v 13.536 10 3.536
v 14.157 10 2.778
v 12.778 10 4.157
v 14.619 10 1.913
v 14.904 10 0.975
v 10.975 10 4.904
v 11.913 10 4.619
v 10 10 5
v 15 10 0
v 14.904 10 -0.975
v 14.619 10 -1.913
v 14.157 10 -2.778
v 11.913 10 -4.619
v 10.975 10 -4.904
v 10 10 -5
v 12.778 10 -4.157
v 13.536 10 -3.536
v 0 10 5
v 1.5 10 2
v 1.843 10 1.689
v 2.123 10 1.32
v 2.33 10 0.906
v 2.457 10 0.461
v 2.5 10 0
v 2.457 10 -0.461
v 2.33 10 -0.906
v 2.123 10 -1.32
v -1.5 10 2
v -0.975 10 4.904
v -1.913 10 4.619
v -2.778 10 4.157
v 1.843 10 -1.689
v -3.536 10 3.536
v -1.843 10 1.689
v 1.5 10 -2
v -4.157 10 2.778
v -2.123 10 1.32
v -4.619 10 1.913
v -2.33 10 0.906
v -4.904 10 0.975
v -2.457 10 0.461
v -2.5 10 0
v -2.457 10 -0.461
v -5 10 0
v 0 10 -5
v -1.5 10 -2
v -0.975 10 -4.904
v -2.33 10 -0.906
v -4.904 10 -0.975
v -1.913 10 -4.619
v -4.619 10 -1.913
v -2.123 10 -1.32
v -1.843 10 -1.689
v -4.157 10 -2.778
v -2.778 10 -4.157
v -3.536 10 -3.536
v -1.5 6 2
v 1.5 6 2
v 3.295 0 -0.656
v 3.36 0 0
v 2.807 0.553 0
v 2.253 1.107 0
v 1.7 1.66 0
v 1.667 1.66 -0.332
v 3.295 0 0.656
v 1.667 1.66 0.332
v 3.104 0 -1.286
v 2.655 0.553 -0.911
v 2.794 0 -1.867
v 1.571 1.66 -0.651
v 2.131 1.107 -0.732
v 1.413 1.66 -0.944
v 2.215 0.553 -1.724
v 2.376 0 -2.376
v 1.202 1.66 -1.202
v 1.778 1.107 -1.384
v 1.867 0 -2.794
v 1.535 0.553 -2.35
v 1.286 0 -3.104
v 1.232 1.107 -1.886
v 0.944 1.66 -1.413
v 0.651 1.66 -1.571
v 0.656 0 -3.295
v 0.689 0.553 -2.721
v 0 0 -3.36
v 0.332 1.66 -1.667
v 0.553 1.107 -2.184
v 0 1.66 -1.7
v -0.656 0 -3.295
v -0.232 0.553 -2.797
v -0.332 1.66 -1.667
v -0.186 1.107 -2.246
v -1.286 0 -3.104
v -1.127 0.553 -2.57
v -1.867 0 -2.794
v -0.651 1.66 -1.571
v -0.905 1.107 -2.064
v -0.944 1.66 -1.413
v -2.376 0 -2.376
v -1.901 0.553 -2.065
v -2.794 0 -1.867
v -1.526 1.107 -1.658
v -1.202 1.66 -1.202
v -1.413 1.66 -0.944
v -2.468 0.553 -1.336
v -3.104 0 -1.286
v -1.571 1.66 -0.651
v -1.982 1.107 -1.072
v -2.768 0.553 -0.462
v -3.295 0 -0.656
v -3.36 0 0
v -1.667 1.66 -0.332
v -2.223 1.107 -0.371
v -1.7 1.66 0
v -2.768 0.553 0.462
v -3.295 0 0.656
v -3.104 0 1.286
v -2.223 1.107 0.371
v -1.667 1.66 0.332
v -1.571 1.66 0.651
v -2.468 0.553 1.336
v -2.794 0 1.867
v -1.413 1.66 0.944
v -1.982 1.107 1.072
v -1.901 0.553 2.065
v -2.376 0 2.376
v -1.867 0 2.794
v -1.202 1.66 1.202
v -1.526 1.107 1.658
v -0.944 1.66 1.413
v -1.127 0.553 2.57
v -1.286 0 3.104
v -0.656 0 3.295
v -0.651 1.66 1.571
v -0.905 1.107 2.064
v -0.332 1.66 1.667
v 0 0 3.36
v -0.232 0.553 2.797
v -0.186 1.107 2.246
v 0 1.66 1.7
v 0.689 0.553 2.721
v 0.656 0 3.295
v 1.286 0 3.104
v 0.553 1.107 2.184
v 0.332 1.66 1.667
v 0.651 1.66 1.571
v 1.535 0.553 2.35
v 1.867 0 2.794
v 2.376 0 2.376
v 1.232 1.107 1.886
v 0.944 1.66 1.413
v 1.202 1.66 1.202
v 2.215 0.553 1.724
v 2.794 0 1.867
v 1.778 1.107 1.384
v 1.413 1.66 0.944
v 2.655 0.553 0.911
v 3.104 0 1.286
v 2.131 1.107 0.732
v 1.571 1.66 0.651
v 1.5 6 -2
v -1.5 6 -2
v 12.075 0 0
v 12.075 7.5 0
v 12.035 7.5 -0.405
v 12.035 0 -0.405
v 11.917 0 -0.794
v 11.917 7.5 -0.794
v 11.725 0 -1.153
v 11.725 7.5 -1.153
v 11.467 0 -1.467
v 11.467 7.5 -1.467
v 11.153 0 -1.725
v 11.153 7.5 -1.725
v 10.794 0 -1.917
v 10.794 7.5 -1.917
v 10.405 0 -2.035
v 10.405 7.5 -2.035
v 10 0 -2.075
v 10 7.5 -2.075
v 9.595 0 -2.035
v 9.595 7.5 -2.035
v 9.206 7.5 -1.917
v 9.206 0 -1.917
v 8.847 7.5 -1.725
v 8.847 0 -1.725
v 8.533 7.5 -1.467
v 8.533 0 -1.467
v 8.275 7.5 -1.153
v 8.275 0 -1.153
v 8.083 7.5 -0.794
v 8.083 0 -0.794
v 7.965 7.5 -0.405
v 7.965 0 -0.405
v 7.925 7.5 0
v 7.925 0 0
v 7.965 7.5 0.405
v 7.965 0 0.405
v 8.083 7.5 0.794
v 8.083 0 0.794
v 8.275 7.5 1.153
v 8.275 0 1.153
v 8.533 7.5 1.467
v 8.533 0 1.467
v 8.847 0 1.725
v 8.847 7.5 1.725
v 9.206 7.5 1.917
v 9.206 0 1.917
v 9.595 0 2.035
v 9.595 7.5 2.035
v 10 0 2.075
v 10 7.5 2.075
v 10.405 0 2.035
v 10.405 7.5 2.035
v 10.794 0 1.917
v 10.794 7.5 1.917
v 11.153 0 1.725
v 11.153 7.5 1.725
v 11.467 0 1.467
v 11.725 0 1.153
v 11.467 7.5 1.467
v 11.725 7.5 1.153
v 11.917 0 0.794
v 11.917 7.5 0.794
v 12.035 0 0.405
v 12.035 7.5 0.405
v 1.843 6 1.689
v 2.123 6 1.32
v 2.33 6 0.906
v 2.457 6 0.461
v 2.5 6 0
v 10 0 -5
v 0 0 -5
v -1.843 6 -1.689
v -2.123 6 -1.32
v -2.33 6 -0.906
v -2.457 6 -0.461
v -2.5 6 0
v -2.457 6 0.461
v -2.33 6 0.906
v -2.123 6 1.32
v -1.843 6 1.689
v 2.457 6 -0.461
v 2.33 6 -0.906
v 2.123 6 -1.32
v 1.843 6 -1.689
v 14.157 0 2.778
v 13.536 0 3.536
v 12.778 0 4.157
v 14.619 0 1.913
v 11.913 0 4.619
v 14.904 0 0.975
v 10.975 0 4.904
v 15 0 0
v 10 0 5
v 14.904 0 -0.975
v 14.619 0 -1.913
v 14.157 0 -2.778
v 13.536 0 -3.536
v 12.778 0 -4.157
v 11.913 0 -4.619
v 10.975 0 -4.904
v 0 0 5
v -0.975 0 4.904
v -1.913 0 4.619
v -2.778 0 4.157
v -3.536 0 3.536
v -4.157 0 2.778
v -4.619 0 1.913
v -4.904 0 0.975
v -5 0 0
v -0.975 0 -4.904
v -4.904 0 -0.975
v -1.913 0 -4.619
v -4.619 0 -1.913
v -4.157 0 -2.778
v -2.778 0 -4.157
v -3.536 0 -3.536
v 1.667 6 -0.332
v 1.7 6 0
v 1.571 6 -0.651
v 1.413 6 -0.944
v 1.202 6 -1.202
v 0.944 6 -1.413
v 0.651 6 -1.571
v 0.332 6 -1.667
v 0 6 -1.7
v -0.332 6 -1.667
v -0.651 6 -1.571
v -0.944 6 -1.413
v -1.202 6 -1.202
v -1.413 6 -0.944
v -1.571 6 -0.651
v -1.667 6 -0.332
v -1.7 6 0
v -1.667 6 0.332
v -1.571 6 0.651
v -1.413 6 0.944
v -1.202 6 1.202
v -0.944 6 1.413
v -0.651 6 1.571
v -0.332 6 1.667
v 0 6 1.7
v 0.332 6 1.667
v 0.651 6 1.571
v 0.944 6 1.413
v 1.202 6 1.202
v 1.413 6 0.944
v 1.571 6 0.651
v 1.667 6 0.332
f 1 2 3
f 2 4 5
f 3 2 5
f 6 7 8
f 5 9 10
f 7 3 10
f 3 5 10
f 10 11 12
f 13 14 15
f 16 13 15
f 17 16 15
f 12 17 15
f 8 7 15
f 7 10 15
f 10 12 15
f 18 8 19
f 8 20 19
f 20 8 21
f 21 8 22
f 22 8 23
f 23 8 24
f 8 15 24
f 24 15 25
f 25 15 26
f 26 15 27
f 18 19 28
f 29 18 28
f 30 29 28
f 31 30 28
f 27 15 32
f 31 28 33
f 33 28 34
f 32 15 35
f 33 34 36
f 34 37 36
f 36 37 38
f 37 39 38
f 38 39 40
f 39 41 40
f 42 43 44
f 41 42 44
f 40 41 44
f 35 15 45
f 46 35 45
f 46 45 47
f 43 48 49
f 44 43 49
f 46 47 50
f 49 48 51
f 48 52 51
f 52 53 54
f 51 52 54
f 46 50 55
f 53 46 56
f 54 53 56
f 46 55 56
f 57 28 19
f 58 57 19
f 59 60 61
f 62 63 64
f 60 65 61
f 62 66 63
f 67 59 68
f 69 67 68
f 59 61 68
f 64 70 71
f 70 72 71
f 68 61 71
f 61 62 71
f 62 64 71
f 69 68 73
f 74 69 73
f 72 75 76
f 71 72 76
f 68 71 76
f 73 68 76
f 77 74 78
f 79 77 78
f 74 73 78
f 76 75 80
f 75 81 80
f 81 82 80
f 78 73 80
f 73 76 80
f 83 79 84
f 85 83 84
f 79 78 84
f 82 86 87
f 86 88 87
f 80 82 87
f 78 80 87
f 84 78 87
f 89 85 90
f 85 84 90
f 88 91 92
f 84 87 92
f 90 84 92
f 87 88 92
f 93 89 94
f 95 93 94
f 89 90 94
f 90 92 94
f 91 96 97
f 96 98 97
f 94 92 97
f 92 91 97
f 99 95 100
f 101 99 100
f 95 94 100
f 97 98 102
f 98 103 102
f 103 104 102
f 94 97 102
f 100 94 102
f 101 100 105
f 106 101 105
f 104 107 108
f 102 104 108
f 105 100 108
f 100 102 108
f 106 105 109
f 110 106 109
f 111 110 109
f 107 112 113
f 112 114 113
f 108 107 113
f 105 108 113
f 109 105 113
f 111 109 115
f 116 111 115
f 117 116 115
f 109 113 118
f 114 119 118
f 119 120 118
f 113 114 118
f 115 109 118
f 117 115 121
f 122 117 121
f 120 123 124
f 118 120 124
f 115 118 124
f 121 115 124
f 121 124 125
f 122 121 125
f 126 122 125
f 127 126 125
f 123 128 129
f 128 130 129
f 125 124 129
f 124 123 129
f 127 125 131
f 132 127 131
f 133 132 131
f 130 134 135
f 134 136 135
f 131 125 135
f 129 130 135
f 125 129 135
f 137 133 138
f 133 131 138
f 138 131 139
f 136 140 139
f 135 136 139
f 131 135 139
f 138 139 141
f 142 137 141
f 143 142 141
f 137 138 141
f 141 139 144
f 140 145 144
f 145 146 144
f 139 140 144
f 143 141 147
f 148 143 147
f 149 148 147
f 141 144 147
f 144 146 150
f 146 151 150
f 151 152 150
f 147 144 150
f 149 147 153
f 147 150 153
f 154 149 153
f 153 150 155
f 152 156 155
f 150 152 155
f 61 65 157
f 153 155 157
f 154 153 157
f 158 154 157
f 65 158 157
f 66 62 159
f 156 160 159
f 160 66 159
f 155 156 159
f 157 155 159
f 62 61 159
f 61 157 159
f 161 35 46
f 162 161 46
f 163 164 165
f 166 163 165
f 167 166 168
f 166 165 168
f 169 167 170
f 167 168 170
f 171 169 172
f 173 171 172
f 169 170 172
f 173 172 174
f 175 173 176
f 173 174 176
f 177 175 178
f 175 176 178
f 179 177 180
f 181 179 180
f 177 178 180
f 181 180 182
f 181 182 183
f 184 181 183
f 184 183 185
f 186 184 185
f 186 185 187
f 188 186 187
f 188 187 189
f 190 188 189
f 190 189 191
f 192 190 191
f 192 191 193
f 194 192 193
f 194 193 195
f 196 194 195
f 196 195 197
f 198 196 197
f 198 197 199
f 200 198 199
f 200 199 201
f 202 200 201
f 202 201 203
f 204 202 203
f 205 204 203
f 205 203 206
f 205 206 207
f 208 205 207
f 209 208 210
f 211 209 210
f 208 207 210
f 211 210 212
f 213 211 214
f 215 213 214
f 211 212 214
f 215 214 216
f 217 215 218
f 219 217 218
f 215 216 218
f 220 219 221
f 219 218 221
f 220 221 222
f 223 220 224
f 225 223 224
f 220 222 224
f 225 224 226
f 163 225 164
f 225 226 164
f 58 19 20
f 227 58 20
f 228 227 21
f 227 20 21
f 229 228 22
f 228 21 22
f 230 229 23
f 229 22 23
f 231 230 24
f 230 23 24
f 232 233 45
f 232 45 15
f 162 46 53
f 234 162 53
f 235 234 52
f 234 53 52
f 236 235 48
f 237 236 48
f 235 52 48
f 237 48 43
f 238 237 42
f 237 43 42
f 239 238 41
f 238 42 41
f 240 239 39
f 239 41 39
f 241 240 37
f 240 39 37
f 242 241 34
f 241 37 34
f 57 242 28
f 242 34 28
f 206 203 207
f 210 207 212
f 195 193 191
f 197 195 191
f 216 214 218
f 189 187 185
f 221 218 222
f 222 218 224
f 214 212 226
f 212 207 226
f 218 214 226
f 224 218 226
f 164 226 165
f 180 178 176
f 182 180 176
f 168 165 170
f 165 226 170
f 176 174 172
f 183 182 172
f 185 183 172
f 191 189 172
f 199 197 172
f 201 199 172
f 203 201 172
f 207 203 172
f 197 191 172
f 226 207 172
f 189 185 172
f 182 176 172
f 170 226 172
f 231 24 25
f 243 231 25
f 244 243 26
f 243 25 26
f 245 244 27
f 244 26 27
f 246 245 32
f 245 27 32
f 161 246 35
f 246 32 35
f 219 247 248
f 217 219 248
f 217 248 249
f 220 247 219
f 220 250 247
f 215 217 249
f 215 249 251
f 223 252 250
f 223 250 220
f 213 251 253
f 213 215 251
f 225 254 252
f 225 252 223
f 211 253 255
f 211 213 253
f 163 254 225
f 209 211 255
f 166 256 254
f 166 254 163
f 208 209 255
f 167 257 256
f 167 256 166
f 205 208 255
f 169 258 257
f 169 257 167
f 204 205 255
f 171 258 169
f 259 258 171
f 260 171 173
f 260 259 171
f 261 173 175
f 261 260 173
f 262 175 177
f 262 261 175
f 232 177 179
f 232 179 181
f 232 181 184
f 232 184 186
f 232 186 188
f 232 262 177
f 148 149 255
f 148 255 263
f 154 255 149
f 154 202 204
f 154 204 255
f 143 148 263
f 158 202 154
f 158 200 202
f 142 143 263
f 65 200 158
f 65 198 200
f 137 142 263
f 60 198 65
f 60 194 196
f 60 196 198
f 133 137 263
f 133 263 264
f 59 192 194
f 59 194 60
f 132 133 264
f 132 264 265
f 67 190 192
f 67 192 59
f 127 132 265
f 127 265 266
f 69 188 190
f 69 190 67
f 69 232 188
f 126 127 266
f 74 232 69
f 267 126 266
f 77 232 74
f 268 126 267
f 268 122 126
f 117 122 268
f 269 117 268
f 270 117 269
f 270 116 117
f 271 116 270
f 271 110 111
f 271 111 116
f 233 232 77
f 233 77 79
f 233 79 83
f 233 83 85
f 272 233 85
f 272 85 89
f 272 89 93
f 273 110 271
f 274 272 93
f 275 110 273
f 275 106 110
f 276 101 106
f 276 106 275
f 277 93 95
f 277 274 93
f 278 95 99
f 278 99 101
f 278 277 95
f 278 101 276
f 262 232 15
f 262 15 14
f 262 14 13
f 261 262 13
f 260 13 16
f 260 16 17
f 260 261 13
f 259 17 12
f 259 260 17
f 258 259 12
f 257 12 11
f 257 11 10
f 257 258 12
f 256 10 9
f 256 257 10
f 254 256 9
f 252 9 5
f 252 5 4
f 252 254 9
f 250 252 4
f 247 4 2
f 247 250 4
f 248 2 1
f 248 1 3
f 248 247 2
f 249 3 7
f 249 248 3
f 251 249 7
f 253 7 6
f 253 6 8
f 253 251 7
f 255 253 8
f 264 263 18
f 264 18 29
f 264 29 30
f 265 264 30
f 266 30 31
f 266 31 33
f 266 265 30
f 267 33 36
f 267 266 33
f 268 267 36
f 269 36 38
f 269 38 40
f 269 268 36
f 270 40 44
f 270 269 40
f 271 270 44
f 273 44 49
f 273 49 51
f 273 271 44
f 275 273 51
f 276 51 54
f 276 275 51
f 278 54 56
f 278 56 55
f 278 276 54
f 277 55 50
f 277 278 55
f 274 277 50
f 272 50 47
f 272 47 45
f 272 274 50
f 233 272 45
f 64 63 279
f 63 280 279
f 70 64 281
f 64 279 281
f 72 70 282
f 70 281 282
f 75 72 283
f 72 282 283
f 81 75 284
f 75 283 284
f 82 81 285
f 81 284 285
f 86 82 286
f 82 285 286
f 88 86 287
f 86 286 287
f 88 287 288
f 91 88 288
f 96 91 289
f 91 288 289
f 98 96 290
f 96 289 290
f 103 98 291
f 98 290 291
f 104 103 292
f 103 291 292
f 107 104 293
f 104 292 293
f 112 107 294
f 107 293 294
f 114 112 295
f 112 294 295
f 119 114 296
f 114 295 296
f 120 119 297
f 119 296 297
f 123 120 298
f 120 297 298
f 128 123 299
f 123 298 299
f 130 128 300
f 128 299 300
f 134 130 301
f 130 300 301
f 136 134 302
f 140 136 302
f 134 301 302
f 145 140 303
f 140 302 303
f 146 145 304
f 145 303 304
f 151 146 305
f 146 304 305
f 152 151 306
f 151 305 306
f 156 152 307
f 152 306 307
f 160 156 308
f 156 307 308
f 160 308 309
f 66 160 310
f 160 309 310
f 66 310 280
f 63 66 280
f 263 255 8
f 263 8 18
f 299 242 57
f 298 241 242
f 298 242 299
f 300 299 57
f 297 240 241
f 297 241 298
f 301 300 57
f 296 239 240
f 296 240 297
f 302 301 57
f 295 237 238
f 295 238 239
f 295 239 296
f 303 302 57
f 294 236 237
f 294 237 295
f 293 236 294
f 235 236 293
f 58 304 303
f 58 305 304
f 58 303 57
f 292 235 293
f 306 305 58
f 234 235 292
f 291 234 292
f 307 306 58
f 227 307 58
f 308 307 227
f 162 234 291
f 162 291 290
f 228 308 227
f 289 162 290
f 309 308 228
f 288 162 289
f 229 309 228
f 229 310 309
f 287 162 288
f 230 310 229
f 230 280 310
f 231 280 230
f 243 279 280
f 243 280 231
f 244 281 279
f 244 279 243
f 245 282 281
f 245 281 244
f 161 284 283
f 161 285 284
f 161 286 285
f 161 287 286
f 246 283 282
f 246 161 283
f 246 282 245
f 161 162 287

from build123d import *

# Parameters (mm, degrees)
EXTRUDE_1_DEPTH              = 10
CUT_EXTRUDE_1_DEPTH          = 4
HOLE_WIZARD_M3_1_D           = 3.4
HOLE_WIZARD_M3_1_DEPTH       = 8.1
HOLE_WIZARD_M3_1_CSINK_D     = 6.72
HOLE_WIZARD_M3_1_CSINK_ANGLE = 90
HOLE_WIZARD_M3_1_TIP         = 1.021463052
HOLE_WIZARD_1_D              = 4.15
HOLE_WIZARD_1_DEPTH          = 7.5


with BuildPart() as part:
    # 草图1 → 凸台-拉伸1 (new body)
    with BuildSketch(Plane(origin=(0, 0, 0), x_dir=(1, 0, 0), z_dir=(0, 1, 0))):
        with BuildLine():
            Line((0, 5), (10, 5))
            ThreePointArc((10, 5), (15, 0), (10, -5))
            Line((10, -5), (0, -5))
            ThreePointArc((0, -5), (-5, 0), (0, 5))
        make_face()
    extrude(amount=EXTRUDE_1_DEPTH)

    # 草图2 → 切除-拉伸1 (cut)
    with BuildSketch(Plane(origin=(0, 10, 0), x_dir=(1, 0, 0), z_dir=(0, 1, 0))):
        with BuildLine():
            Line((1.5, 2), (-1.5, 2))
            ThreePointArc((-1.5, 2), (-2.5, 0), (-1.5, -2))
            Line((-1.5, -2), (1.5, -2))
            ThreePointArc((1.5, -2), (2.236067977, -1.118033989), (2.5, 0))
            ThreePointArc((2.5, 0), (2.236067977, 1.118033989), (1.5, 2))
        make_face()
    extrude(amount=-CUT_EXTRUDE_1_DEPTH, mode=Mode.SUBTRACT)

    # M3 六角凹锥坑螺钉的锥形沉头孔1
    with Locations(Plane(origin=(0, 0, 0), x_dir=(-1, 0, 0), z_dir=(0, -1, 0))):
        with Locations((0, 0)):
            CounterSinkHole(HOLE_WIZARD_M3_1_D / 2, HOLE_WIZARD_M3_1_CSINK_D / 2, depth=HOLE_WIZARD_M3_1_DEPTH, counter_sink_angle=HOLE_WIZARD_M3_1_CSINK_ANGLE)
            with Locations((0, 0, -(HOLE_WIZARD_M3_1_DEPTH + HOLE_WIZARD_M3_1_TIP / 2))):  # 118° drill point
                Cone(0, HOLE_WIZARD_M3_1_D / 2, HOLE_WIZARD_M3_1_TIP, mode=Mode.SUBTRACT)

    # 孔1
    with Locations(Plane(origin=(0, 0, 0), x_dir=(-1, 0, 0), z_dir=(0, -1, 0))):
        with Locations((-10, 0)):
            Hole(HOLE_WIZARD_1_D / 2, depth=HOLE_WIZARD_1_DEPTH)


solid = part.part
